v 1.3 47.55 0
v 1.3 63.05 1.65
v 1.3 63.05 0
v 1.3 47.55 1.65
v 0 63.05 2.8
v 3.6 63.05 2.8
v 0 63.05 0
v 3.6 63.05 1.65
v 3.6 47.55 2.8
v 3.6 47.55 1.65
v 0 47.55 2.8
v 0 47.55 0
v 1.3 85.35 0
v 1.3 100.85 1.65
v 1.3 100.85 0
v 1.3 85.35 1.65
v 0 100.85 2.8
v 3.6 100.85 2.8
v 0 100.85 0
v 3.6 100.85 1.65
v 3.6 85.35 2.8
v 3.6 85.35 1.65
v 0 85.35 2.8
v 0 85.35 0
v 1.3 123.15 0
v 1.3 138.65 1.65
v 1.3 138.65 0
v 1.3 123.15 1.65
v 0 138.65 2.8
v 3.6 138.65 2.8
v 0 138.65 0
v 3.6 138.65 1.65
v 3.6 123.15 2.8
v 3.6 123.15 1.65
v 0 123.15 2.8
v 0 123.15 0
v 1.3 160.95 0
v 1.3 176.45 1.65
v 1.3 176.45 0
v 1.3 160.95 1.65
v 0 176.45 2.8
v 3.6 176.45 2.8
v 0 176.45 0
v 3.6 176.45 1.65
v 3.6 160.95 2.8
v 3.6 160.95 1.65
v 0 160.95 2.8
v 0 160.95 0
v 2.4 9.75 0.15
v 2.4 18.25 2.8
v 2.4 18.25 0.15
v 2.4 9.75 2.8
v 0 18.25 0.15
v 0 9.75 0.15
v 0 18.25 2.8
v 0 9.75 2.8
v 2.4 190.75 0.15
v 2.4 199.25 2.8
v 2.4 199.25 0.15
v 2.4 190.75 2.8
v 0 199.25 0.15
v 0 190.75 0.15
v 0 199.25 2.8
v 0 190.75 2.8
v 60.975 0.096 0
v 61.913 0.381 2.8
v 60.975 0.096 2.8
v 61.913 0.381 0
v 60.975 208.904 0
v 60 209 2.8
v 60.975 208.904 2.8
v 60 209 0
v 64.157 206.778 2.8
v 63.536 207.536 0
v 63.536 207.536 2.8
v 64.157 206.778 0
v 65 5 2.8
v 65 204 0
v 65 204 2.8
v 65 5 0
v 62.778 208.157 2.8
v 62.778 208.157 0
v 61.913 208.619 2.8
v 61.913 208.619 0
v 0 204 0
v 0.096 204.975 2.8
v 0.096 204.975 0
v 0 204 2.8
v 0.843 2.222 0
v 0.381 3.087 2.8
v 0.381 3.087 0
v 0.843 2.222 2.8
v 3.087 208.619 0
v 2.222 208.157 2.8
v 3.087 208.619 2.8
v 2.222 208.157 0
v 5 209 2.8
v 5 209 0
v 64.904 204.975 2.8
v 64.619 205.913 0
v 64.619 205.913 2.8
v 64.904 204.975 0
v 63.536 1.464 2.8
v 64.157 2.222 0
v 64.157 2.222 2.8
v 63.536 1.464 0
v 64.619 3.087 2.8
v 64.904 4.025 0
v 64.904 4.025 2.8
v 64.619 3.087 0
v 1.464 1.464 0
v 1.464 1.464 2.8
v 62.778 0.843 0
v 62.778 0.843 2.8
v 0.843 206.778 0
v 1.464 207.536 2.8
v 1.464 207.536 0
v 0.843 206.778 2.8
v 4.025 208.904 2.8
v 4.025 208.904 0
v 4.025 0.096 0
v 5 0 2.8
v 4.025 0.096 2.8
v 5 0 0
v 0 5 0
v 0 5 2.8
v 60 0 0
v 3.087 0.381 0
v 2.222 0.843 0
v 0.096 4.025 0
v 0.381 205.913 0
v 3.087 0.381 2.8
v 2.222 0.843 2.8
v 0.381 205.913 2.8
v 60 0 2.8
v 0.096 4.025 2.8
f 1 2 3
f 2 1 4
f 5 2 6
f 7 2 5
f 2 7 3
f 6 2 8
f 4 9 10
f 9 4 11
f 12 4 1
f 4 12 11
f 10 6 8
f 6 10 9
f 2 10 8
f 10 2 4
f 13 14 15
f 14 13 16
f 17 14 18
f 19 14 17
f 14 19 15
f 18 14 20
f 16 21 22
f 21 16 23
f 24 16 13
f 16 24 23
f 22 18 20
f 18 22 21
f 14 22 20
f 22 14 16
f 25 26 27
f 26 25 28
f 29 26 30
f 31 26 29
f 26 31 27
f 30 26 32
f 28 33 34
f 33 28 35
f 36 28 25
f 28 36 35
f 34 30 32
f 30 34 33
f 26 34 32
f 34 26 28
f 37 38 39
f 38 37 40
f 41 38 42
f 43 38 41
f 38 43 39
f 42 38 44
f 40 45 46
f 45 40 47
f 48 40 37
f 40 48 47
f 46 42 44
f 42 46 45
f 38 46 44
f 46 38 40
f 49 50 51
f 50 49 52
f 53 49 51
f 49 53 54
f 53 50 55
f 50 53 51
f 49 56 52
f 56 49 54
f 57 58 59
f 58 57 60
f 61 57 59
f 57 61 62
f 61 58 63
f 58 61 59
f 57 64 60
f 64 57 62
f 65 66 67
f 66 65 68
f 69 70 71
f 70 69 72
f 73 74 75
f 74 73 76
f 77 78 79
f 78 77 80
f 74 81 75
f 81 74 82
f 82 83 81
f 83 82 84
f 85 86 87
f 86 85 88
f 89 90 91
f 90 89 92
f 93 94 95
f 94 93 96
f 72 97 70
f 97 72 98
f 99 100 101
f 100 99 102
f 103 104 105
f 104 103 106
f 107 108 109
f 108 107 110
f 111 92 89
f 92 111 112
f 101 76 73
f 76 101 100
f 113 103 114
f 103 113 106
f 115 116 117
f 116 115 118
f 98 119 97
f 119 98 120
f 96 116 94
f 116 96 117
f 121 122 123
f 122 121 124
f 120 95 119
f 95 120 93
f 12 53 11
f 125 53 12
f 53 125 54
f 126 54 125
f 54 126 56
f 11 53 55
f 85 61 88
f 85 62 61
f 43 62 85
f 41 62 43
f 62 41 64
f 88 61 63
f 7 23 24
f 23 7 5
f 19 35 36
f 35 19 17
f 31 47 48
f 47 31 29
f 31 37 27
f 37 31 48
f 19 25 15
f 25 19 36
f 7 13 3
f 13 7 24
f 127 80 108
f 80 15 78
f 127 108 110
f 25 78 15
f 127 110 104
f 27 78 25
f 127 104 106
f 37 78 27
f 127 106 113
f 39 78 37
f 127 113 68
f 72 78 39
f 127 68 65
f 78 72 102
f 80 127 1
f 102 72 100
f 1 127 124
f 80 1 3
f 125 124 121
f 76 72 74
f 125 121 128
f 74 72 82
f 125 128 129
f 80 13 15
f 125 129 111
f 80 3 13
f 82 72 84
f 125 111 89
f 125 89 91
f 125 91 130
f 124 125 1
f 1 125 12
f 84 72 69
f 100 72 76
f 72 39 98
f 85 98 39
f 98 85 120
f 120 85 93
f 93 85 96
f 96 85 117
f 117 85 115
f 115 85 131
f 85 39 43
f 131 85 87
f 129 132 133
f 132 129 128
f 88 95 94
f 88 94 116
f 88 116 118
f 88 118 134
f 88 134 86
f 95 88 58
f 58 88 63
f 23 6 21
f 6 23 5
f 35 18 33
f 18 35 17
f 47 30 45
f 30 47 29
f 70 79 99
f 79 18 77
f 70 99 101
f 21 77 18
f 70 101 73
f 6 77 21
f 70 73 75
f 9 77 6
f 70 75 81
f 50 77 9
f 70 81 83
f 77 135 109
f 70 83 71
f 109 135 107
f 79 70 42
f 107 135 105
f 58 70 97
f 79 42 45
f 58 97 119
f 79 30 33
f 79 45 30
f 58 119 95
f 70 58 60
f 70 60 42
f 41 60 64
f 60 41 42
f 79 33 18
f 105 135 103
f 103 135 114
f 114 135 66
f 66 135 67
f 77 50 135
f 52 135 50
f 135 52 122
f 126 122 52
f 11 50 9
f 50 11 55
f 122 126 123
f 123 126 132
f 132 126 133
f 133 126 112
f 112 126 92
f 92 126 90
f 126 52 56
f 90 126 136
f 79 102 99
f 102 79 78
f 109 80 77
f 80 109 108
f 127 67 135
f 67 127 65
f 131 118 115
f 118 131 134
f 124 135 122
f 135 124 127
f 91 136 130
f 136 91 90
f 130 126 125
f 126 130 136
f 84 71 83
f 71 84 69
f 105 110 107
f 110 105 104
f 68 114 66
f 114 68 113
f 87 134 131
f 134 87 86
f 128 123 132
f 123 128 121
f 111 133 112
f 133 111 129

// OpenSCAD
// 机箱前面板 - B块 (65mm × 209mm × 2.8mm)
// 带卡扣拼接结构 (凹槽)

// 参数
width = 65;      // 宽度 (mm)
height = 209;    // 高度 (mm)
thickness = 2.8; // 厚度 (mm)
corner_radius = 5;  // 倒角半径 (mm)

// 卡扣参数 (与A块匹配)
tab_width = 15;      // 卡扣宽度 (mm)
tab_height = 3.5;    // 卡扣高度 (mm)
tab_depth = 1.2;     // 卡槽深度 (比凸扣深0.2mm，留间隙)
tab_count = 4;       // 卡扣数量
tab_spacing = (height - 20) / (tab_count + 1);  // 卡扣间距

// 圆角矩形模块
module rounded_rect(w, h, r, t) {
    hull() {
        translate([r, r, 0]) cylinder(h = t, r = r, $fn = 32);
        translate([w - r, r, 0]) cylinder(h = t, r = r, $fn = 32);
        translate([w - r, h - r, 0]) cylinder(h = t, r = r, $fn = 32);
        translate([r, h - r, 0]) cylinder(h = t, r = r, $fn = 32);
    }
}

// 卡扣凹槽 (在左侧边缘)
module tab_slot(y_pos) {
    translate([-0.1, y_pos - 0.25, thickness/2 - tab_height/2])
    union() {
        // 主凹槽
        cube([tab_depth + 0.2, tab_width + 0.5, tab_height + 0.5]);

        // 卡勾容纳槽
        translate([tab_depth, 0, tab_height - 1.5])
        cube([2.5, tab_width + 0.5, 2]);
    }
}

// 定位凹槽
module alignment_slot() {
    translate([-0.1, 10 - 0.25, thickness/2 - 1.25])
    cube([2.5, 8.5, 3]);

    translate([-0.1, height - 18 - 0.25, thickness/2 - 1.25])
    cube([2.5, 8.5, 3]);
}

// 创建主体
difference() {
    // 前面板主体
    color("LightGray") {
        rounded_rect(width, height, corner_radius, thickness);
    }

    // 卡扣凹槽
    color("DarkGray") {
        for (i = [0:tab_count-1]) {
            tab_slot(10 + (i + 1) * tab_spacing);
        }
    }

    // 定位凹槽
    alignment_slot();
}

// 装配辅助 (打印时可注释掉)
// translate([-5, 0, 0])
// color("LightGray", 0.3)
// import("front_panel_A.stl");
